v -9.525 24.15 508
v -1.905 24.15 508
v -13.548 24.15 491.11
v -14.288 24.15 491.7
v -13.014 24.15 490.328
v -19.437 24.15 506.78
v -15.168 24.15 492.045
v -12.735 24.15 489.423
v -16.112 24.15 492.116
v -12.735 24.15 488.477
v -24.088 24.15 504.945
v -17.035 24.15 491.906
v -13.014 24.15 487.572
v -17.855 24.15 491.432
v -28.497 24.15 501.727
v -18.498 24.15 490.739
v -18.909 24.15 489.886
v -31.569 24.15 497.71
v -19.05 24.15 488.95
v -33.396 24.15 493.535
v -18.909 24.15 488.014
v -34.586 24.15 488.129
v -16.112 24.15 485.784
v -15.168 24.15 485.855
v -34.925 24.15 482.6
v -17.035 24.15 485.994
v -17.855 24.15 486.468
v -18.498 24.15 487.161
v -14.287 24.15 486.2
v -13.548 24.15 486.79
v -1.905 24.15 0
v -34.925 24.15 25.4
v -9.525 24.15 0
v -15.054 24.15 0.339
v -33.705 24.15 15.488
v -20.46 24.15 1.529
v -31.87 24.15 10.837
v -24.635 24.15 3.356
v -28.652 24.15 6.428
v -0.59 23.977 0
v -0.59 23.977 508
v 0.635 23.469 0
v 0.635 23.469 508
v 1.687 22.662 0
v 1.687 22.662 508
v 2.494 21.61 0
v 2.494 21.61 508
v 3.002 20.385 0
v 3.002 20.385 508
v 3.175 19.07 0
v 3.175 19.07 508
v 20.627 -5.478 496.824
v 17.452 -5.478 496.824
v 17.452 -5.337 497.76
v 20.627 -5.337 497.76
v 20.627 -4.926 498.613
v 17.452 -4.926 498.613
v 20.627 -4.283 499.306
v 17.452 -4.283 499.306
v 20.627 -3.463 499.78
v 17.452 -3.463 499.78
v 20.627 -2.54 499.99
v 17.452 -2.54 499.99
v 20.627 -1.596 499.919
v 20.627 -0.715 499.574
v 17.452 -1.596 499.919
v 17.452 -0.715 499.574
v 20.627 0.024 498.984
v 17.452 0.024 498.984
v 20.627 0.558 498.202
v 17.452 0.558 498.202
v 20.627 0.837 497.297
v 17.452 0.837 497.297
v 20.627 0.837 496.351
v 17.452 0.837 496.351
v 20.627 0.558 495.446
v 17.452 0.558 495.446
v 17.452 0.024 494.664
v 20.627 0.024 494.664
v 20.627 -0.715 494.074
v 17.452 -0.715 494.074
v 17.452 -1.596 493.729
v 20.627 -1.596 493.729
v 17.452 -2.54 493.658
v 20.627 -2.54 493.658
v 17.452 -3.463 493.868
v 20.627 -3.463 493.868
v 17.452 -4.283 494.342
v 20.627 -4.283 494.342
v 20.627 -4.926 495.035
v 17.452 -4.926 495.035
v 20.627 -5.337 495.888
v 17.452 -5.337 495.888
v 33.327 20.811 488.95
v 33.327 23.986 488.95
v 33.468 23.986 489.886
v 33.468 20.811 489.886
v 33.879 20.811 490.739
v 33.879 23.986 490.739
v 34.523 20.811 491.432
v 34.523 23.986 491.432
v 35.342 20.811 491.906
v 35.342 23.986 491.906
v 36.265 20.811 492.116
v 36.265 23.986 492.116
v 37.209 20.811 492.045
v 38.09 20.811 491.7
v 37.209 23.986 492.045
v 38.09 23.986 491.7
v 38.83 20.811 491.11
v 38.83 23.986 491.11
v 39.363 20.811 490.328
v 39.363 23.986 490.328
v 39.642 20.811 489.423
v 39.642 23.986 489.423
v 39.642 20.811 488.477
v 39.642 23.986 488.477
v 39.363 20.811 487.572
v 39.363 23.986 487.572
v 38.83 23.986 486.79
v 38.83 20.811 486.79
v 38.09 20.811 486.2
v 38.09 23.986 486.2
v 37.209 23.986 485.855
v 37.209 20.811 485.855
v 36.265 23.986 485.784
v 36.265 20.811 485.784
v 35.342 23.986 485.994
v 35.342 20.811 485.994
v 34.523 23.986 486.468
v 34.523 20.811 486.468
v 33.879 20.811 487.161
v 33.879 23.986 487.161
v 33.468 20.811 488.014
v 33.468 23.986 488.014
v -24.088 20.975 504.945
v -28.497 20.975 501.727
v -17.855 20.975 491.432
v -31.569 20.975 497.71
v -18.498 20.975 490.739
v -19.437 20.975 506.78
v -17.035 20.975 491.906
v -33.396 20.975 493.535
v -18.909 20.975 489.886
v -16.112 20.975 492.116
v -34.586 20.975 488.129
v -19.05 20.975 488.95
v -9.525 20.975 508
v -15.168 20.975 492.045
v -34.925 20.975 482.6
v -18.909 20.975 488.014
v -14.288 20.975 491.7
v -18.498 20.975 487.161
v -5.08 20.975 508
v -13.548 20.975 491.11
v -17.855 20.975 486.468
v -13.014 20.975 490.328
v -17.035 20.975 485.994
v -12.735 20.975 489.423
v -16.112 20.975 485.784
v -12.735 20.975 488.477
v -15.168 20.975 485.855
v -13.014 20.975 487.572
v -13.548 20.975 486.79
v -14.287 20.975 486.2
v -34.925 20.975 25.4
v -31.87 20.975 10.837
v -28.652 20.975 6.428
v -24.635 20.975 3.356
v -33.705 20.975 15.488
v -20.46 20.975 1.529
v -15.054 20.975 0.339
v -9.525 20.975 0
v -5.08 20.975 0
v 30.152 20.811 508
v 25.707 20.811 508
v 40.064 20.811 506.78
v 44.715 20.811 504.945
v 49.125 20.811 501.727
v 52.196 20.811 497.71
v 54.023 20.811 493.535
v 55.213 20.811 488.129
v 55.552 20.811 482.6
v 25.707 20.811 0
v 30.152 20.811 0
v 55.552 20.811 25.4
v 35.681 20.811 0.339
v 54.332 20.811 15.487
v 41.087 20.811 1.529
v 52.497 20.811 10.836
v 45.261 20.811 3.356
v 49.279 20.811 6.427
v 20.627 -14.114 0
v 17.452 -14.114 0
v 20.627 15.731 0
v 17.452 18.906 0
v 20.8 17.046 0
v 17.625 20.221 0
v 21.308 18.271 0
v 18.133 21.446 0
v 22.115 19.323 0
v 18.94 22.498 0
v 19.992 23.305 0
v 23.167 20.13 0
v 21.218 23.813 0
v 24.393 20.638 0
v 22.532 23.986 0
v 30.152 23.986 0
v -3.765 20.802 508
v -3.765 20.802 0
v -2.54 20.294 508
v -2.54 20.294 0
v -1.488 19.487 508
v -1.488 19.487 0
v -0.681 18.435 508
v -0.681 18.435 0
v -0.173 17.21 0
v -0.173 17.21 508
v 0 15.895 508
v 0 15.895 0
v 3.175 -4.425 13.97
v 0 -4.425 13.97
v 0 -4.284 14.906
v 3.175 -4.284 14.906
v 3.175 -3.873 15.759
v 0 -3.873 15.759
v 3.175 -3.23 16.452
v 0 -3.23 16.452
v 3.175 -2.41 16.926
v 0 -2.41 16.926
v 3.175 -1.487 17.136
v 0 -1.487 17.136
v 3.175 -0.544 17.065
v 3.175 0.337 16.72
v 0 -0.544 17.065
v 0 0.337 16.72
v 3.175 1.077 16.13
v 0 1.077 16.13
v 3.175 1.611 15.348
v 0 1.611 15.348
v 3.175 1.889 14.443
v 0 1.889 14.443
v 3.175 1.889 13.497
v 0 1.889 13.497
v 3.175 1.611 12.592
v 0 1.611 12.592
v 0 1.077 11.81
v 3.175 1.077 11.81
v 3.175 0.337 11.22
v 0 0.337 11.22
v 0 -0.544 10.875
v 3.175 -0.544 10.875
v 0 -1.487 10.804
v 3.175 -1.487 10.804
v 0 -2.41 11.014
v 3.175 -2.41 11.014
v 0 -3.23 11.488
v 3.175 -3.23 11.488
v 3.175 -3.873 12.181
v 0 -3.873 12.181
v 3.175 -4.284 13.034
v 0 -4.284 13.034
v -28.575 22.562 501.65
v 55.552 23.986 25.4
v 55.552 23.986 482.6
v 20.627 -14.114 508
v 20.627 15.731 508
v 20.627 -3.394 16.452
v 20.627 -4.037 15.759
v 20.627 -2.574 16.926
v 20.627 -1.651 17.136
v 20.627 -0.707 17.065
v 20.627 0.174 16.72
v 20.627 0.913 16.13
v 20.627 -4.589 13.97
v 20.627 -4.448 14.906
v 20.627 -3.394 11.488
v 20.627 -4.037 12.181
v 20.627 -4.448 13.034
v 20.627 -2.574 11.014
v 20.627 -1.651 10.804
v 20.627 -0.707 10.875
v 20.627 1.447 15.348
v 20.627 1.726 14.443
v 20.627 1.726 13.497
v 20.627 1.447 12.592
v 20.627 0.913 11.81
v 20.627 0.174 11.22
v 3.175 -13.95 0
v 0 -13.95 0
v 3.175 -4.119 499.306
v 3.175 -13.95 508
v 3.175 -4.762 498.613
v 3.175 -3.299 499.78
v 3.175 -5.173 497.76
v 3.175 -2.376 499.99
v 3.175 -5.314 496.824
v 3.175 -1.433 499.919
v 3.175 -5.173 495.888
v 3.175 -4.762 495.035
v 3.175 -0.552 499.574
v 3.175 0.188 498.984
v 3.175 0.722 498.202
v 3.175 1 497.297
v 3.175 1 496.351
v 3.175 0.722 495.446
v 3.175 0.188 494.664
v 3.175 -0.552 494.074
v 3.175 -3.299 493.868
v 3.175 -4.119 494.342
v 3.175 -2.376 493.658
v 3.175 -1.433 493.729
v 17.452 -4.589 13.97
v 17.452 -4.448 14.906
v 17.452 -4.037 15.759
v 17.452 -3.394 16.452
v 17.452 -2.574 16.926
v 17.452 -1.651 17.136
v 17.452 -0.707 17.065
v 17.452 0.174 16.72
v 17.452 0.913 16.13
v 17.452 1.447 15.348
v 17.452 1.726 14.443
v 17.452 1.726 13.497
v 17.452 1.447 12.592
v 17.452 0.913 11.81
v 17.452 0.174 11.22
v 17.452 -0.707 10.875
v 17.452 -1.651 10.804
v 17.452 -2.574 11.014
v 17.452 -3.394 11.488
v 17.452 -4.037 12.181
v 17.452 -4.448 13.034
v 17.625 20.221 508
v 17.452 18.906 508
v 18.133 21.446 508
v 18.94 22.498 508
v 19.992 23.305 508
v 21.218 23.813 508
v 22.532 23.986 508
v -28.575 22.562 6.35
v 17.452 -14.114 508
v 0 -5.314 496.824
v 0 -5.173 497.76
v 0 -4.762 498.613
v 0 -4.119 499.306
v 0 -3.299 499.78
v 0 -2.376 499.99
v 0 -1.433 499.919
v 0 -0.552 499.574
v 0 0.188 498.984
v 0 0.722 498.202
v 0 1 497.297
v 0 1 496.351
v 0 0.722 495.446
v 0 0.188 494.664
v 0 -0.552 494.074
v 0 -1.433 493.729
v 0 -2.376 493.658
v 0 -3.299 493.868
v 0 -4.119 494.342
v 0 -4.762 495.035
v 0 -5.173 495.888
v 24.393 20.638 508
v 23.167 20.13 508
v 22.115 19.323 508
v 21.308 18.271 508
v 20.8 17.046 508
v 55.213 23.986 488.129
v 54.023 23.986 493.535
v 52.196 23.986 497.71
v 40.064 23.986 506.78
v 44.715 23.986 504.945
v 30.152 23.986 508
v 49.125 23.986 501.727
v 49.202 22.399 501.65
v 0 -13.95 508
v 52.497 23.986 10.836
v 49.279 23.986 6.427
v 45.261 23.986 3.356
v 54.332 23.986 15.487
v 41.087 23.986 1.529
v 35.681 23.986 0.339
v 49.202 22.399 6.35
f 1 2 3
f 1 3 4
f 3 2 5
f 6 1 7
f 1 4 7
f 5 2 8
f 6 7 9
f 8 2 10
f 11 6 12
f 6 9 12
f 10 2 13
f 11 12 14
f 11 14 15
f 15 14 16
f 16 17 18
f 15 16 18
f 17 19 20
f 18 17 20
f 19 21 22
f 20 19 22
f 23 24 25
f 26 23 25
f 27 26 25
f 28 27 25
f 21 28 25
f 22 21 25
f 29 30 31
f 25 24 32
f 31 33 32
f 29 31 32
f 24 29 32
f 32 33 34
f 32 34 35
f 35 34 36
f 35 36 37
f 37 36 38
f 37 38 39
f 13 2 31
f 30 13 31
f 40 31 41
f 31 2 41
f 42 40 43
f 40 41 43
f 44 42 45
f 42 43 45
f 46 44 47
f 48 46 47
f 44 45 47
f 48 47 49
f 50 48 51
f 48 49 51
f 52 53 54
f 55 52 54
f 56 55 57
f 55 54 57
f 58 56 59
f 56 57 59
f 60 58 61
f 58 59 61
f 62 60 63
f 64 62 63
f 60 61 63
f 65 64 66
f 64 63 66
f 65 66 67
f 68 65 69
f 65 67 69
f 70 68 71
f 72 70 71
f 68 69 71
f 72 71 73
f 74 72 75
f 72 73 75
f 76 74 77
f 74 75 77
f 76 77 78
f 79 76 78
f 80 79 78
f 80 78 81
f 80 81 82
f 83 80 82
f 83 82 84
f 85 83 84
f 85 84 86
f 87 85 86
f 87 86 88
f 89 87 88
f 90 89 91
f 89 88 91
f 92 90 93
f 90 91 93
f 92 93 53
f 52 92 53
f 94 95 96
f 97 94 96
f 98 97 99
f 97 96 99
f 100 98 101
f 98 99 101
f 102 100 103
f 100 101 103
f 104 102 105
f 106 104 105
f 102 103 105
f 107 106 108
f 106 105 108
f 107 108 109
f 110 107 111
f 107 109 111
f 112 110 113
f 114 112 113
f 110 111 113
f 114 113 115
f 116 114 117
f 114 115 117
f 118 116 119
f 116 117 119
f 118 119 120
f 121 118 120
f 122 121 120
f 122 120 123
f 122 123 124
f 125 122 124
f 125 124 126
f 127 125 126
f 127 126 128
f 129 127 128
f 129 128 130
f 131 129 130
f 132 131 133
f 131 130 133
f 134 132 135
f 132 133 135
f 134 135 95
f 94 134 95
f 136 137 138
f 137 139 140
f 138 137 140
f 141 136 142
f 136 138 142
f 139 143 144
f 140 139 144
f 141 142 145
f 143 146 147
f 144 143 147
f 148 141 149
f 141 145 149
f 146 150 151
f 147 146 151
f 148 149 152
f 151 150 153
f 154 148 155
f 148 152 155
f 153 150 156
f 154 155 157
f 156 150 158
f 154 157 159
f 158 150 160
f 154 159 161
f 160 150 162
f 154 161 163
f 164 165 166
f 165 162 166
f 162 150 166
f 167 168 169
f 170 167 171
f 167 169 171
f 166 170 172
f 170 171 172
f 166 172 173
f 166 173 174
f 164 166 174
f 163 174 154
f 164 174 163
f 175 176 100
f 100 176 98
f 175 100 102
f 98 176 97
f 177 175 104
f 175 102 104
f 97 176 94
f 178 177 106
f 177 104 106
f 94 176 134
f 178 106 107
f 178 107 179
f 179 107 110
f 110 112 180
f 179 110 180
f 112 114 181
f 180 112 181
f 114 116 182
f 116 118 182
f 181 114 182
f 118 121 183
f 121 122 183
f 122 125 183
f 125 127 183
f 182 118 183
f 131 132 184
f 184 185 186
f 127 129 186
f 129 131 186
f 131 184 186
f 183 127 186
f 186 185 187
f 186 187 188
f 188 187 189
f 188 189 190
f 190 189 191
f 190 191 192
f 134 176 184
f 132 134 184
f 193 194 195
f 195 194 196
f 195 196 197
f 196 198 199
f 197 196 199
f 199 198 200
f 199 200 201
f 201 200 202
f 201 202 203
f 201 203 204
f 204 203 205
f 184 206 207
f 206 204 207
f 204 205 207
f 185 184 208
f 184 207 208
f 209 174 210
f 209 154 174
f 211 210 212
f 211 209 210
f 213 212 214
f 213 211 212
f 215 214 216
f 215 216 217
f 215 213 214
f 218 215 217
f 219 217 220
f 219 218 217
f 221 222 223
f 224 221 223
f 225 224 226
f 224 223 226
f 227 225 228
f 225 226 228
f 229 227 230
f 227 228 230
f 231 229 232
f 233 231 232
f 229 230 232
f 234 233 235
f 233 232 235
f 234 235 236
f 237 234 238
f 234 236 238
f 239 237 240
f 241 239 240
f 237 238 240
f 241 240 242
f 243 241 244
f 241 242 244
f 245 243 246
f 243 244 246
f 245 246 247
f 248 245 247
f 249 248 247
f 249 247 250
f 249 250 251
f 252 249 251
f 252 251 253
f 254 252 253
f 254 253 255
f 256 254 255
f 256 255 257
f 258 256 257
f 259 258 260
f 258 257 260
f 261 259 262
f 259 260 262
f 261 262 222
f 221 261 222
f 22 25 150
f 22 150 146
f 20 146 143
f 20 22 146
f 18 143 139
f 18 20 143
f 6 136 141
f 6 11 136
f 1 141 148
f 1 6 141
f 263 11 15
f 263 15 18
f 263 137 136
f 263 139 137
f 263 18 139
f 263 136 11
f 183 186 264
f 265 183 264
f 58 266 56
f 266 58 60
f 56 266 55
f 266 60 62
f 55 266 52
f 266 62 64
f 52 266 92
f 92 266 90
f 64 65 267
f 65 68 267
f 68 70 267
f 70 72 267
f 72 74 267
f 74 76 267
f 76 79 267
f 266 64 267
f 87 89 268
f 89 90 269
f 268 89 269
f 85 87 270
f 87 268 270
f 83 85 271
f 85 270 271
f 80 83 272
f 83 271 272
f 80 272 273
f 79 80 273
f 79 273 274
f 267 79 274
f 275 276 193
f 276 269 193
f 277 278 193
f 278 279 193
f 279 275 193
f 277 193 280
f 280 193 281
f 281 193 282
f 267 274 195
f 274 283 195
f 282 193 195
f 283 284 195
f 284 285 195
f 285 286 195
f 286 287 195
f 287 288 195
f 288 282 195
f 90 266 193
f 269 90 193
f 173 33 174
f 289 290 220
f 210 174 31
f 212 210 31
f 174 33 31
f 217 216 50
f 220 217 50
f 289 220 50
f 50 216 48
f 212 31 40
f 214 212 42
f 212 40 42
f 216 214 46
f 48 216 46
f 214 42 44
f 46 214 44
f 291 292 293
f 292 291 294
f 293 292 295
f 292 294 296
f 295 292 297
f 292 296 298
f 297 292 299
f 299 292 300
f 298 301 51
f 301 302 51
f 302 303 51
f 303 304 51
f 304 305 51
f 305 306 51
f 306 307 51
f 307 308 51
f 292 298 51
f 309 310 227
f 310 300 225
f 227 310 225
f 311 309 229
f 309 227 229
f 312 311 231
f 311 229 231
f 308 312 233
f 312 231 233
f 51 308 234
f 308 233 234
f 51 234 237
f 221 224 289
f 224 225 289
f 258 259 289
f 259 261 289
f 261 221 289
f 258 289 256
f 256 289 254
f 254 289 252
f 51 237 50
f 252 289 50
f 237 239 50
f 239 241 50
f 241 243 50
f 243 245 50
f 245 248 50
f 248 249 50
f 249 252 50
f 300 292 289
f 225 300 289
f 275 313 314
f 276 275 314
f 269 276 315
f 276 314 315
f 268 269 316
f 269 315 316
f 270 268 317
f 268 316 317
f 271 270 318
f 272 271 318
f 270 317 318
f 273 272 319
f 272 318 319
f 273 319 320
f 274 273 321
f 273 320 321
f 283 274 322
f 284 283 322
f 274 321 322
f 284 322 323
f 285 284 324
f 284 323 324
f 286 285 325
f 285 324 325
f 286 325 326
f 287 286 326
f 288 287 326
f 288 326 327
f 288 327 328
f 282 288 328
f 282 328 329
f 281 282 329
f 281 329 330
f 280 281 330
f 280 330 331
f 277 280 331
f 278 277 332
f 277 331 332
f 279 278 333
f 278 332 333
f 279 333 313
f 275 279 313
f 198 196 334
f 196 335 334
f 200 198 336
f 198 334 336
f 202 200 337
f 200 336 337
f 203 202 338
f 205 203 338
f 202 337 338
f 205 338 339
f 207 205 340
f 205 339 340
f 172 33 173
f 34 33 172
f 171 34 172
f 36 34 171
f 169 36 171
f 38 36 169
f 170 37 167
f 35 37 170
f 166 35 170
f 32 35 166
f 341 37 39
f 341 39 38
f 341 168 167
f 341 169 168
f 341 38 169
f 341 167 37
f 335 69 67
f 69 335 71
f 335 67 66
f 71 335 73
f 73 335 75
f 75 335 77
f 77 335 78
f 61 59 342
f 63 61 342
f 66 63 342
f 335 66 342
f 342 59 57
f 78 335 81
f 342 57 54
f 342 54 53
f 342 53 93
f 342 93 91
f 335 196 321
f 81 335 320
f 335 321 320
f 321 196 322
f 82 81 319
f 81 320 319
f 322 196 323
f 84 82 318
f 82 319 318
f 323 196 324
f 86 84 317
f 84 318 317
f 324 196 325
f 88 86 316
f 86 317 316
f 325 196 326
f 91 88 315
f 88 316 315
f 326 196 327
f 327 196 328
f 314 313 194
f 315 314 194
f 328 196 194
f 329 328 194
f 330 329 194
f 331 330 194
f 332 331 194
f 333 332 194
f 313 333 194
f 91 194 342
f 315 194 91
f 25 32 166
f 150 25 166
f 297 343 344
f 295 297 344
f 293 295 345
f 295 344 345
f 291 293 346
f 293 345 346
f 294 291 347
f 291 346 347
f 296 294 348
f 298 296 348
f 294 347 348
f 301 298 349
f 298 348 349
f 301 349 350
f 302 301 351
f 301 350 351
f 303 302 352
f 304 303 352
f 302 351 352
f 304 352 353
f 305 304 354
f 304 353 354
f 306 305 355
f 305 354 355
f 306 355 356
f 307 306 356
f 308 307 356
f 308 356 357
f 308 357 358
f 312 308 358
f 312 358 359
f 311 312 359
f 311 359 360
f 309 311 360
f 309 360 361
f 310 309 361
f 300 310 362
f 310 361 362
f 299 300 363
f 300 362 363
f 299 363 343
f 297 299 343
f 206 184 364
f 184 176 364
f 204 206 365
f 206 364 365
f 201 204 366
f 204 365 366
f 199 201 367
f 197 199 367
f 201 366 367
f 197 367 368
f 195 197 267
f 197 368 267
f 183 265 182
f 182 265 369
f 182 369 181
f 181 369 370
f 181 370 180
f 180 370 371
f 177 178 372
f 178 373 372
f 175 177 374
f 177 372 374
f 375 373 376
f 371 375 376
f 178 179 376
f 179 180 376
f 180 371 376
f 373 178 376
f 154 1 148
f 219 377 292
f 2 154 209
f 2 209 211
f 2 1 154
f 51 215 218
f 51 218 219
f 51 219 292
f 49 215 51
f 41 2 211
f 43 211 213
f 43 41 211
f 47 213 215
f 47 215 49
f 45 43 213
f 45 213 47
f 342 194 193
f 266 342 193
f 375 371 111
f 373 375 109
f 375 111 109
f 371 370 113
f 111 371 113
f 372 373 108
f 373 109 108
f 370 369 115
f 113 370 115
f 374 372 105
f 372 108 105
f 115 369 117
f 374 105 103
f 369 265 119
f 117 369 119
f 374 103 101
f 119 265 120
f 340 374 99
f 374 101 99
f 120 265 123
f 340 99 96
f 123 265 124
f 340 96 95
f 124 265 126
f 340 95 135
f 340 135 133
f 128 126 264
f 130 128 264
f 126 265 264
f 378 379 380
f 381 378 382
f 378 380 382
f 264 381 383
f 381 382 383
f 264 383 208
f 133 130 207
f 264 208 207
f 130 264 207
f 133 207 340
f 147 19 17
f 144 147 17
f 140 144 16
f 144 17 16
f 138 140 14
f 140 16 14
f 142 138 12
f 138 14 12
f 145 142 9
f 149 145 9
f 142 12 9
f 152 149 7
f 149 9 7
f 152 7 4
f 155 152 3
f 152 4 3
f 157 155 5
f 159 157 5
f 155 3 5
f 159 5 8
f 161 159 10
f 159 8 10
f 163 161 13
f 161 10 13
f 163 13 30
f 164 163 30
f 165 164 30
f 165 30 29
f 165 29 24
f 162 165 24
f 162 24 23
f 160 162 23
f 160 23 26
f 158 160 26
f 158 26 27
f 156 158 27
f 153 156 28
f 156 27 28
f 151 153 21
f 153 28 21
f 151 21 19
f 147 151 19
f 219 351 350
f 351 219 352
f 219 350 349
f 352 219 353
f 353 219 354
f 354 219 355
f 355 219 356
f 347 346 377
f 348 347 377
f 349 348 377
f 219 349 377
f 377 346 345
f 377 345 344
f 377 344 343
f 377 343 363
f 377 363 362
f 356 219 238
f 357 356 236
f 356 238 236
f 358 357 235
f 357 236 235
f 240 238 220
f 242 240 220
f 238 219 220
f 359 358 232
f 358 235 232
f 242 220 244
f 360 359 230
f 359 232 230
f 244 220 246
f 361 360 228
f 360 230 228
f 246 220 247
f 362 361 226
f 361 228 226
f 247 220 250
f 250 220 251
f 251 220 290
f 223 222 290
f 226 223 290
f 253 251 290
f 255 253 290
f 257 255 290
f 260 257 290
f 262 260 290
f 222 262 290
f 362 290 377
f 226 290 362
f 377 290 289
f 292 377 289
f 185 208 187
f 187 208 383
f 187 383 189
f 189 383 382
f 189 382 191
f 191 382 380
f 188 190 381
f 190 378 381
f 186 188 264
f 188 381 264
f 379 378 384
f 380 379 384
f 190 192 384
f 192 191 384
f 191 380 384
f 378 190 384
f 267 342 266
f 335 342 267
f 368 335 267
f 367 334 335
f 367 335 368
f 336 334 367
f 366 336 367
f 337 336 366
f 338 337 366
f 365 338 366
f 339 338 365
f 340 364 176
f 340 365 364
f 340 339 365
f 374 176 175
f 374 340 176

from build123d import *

# Parameters (mm, degrees)
F1_DEPTH       = 508
F2_R           = 3.175
F3_DEPTH       = 3.175
F4_R           = 3.175
F5_DEPTH       = 3.175
F7_DEPTH       = 508
F8_R           = 3.175
F9_DEPTH       = 3.175
F10_R          = 3.175
F11_DEPTH      = 3.175
F12_R          = 3.175
F13_DEPTH      = 3.175
F14_T1_DEPTH   = 130.175
F16_T1_DEPTH   = 130.175
F15_R          = 3.175
F17_DEPTH      = 3.175
F18_T1_DEPTH   = 130.175
F18_2_T1_DEPTH = 130.175
F19_R          = 5.08
F19_2_R        = 5.08


# Not quite as in the source:
# - a fillet or chamfer that OpenCascade refuses, or shapes differently, is made with other operations: its cross-section is extruded or revolved along the edge and cut away or added


with BuildPart() as f1:
    # F0 (on Top) → F1 (new body)
    with BuildSketch(Plane.XY):
        Polygon((-34.925, 24.1499475421), (-34.925, 20.9749475421), (0, 20.9749475421), (0, -13.9500524579), (3.175, -13.9500524579), (3.175, 24.1499475421), align=None)
    extrude(amount=F1_DEPTH)

    # F2 (on face) → F3 (cut)
    with BuildSketch(Plane(origin=(0, 0, 0), x_dir=(0, -1, 0), z_dir=(-1, 0, 0))):
        with Locations((2.1390524579, 496.824)):
            Circle(F2_R)
    extrude(amount=-F3_DEPTH, mode=Mode.SUBTRACT)

    # F4 (on face) → F5 (cut)
    with BuildSketch(Plane(origin=(0, 0, 0), x_dir=(0, -1, 0), z_dir=(-1, 0, 0))):
        with Locations((1.2500524579, 13.97)):
            Circle(F4_R)
    extrude(amount=-F5_DEPTH, mode=Mode.SUBTRACT)

    # F16: fillet of radius 25.4 on 1 edges, made by hand

    # F16_s2 → F16_t1 (cut)
    with BuildSketch(Plane.XZ.offset(-87.6499475421)):
        with BuildLine():
            add(Edge.make_bspline(
                [(-34.925, 482.6), (-34.925, 508), (-9.525, 508)],
                knots=[0, 0, 0, 1, 1, 1], degree=2, weights=[1, 1, 1]))
            Line((-9.525, 508), (-34.925, 508))
            Line((-34.925, 508), (-34.925, 482.6))
        make_face()
    extrude(amount=F16_T1_DEPTH, mode=Mode.SUBTRACT)

    # F15 (on face) → F17 (cut)
    with BuildSketch(Plane(origin=(0, 24.1499475421, 0), x_dir=(-1, 0, 0), z_dir=(0, 1, 0))):
        with Locations((15.875, 488.95)):
            Circle(F15_R)
    extrude(amount=-F17_DEPTH, mode=Mode.SUBTRACT)

    # F18#2: fillet of radius 25.4 on 1 edges, made by hand

    # F18_2_s2 → F18_2_t1 (cut)
    with BuildSketch(Plane.XZ.offset(-87.6499475421)):
        with BuildLine():
            add(Edge.make_bspline(
                [(-9.525, 0), (-34.925, 0), (-34.925, 25.4)],
                knots=[0, 0, 0, 1, 1, 1], degree=2, weights=[1, 1, 1]))
            Line((-34.925, 25.4), (-34.925, 0))
            Line((-34.925, 0), (-9.525, 0))
        make_face()
    extrude(amount=F18_2_T1_DEPTH, mode=Mode.SUBTRACT)

    # F19#2
    f19_2_edges = [f1.edges().sort_by_distance(p)[0] for p in [
        (0, 20.974948, 254),
        (3.175, 24.149948, 254),
    ]]
    fillet(f19_2_edges, radius=F19_2_R)


with BuildPart() as f7:
    # F6 (on Top) → F7 (new body)
    with BuildSketch(Plane.XY):
        Polygon((17.4523038154, 23.9860548146), (17.4523038154, -14.1139451854), (20.6273038154, -14.1139451854), (20.6273038154, 20.8110548146), (55.5523038154, 20.8110548146), (55.5523038154, 23.9860548146), align=None)
    extrude(amount=F7_DEPTH)

    # F8 (on face) → F9 (cut)
    with BuildSketch(Plane(origin=(17.4523038154, 0, 0), x_dir=(0, -1, 0), z_dir=(-1, 0, 0))):
        with Locations((2.3029451854, 496.824)):
            Circle(F8_R)
    extrude(amount=-F9_DEPTH, mode=Mode.SUBTRACT)

    # F10 (on face) → F11 (cut)
    with BuildSketch(Plane(origin=(17.4523038154, 0, 0), x_dir=(0, -1, 0), z_dir=(-1, 0, 0))):
        with Locations((1.4139451854, 13.97)):
            Circle(F10_R)
    extrude(amount=-F11_DEPTH, mode=Mode.SUBTRACT)

    # F12 (on face) → F13 (cut)
    with BuildSketch(Plane(origin=(0, 23.9860548146, 0), x_dir=(-1, 0, 0), z_dir=(0, 1, 0))):
        with Locations((-36.5023038154, 488.95)):
            Circle(F12_R)
    extrude(amount=-F13_DEPTH, mode=Mode.SUBTRACT)

    # F14: fillet of radius 25.4 on 1 edges, made by hand

    # F14_s2 → F14_t1 (cut)
    with BuildSketch(Plane.XZ.offset(-87.4860548146)):
        with BuildLine():
            add(Edge.make_bspline(
                [(55.5523038154, 482.6), (55.5523038154, 508), (30.1523038154, 508)],
                knots=[0, 0, 0, 1, 1, 1], degree=2, weights=[1, 1, 1]))
            Line((30.1523038154, 508), (55.5523038154, 508))
            Line((55.5523038154, 508), (55.5523038154, 482.6))
        make_face()
    extrude(amount=F14_T1_DEPTH, mode=Mode.SUBTRACT)

    # F18: fillet of radius 25.4 on 1 edges, made by hand

    # F18_s2 → F18_t1 (cut)
    with BuildSketch(Plane.XZ.offset(-87.4860548146)):
        with BuildLine():
            add(Edge.make_bspline(
                [(30.1523038154, 0), (55.5523038154, 0), (55.5523038154, 25.4)],
                knots=[0, 0, 0, 1, 1, 1], degree=2, weights=[1, 1, 1]))
            Line((55.5523038154, 25.4), (55.5523038154, 0))
            Line((55.5523038154, 0), (30.1523038154, 0))
        make_face()
    extrude(amount=F18_T1_DEPTH, mode=Mode.SUBTRACT)

    # F19
    f19_edges = [f7.edges().sort_by_distance(p)[0] for p in [
        (20.627304, 20.811055, 254),
        (17.452304, 23.986055, 254),
    ]]
    fillet(f19_edges, radius=F19_R)


solid = Compound([f1.part, f7.part])
